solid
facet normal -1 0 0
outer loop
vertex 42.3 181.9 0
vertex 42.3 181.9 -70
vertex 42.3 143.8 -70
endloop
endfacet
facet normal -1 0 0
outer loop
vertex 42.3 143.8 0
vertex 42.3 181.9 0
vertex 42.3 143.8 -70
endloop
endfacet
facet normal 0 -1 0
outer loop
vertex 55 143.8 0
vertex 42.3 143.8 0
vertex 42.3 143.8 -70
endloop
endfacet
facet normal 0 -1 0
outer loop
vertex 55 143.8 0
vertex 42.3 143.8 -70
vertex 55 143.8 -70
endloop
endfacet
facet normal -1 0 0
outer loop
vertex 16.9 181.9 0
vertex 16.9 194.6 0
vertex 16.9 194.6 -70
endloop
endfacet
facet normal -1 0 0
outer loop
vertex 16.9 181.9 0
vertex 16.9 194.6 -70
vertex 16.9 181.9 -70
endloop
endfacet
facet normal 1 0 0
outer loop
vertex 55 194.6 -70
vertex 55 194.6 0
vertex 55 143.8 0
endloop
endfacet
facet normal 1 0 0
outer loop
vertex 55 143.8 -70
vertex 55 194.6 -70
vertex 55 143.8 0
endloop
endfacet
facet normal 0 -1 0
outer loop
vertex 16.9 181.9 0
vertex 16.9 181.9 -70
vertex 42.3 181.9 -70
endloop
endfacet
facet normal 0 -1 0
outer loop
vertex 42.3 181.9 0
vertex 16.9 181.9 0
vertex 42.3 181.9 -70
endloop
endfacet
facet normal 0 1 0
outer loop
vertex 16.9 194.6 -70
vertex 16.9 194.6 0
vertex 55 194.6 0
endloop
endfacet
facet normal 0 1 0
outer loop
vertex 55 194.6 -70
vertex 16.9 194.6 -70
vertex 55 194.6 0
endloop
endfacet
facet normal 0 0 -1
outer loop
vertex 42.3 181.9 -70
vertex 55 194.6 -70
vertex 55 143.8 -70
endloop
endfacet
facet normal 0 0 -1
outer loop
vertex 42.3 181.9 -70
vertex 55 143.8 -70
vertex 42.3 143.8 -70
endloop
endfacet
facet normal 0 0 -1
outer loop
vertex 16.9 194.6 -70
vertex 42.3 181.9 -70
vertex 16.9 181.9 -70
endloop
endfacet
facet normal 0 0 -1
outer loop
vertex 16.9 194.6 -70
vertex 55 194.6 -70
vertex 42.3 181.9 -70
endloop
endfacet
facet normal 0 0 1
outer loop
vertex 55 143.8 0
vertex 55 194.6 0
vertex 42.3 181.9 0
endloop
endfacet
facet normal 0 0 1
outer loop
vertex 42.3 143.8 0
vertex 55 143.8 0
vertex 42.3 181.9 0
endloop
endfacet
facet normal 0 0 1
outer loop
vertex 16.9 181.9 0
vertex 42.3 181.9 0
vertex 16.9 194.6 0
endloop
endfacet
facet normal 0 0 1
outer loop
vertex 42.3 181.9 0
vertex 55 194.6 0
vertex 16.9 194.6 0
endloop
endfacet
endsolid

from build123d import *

# Parameters (mm, degrees)
CROQUIS1_W              = 110
CROQUIS1_H              = 50.8
SALIENTE_EXTRUIR1_DEPTH = 12.7
CROQUIS2_W              = 50.8
CROQUIS2_H              = 220
SALIENTE_EXTRUIR2_DEPTH = 12.7
CROQUIS4_W              = 25.4
CROQUIS4_H              = 12.7
SALIENTE_EXTRUIR3_DEPTH = 57.3
CROQUIS5_W              = 50.8
CROQUIS5_H              = 50.8
CROQUIS5_W_2            = 59.2
CORTAR_EXTRUIR1_DEPTH   = 211.184323868


with BuildPart() as part:
    # Croquis1 → Saliente-Extruir1 (new body)
    with BuildSketch(Plane.XY):
        Rectangle(CROQUIS1_W, CROQUIS1_H)
    extrude(amount=SALIENTE_EXTRUIR1_DEPTH)

    # Croquis2 → Saliente-Extruir2 (add)
    with BuildSketch(Plane(origin=(0, 0, 0), x_dir=(-1, 0, 0), z_dir=(0, 0, -1))):
        with Locations((-29.6, 84.6)):
            Rectangle(CROQUIS2_W, CROQUIS2_H)
    extrude(amount=SALIENTE_EXTRUIR2_DEPTH)

    # Croquis4 → Saliente-Extruir3 (add)
    with BuildSketch(Plane(origin=(0, 0, -12.7), x_dir=(-1, 0, 0), z_dir=(0, 0, -1))):
        Polygon((-42.3, 194.6), (-55, 194.6), (-55, 143.8), (-42.3, 143.8), (-42.3, 181.9), align=None)
        with Locations((-29.6, 188.25)):
            Rectangle(CROQUIS4_W, CROQUIS4_H)
    extrude(amount=SALIENTE_EXTRUIR3_DEPTH)

    # Croquis5 → Cortar-Extruir1 (cut, through all)
    with BuildSketch(Plane(origin=(0, 0, -12.7), x_dir=(-1, 0, 0), z_dir=(0, 0, -1))):
        Polygon((-55, 143.8), (-55, 25.4), (-4.2, 25.4), (-4.2, 194.6), (-16.9, 194.6), (-16.9, 181.9), (-42.3, 181.9), (-42.3, 143.8), align=None)
        with Locations((-29.6, 0)):
            Rectangle(CROQUIS5_W, CROQUIS5_H)
        with Locations((25.4, 0)):
            Rectangle(CROQUIS5_W_2, CROQUIS5_H)
    extrude(amount=-CORTAR_EXTRUIR1_DEPTH, mode=Mode.SUBTRACT)


solid = part.part
